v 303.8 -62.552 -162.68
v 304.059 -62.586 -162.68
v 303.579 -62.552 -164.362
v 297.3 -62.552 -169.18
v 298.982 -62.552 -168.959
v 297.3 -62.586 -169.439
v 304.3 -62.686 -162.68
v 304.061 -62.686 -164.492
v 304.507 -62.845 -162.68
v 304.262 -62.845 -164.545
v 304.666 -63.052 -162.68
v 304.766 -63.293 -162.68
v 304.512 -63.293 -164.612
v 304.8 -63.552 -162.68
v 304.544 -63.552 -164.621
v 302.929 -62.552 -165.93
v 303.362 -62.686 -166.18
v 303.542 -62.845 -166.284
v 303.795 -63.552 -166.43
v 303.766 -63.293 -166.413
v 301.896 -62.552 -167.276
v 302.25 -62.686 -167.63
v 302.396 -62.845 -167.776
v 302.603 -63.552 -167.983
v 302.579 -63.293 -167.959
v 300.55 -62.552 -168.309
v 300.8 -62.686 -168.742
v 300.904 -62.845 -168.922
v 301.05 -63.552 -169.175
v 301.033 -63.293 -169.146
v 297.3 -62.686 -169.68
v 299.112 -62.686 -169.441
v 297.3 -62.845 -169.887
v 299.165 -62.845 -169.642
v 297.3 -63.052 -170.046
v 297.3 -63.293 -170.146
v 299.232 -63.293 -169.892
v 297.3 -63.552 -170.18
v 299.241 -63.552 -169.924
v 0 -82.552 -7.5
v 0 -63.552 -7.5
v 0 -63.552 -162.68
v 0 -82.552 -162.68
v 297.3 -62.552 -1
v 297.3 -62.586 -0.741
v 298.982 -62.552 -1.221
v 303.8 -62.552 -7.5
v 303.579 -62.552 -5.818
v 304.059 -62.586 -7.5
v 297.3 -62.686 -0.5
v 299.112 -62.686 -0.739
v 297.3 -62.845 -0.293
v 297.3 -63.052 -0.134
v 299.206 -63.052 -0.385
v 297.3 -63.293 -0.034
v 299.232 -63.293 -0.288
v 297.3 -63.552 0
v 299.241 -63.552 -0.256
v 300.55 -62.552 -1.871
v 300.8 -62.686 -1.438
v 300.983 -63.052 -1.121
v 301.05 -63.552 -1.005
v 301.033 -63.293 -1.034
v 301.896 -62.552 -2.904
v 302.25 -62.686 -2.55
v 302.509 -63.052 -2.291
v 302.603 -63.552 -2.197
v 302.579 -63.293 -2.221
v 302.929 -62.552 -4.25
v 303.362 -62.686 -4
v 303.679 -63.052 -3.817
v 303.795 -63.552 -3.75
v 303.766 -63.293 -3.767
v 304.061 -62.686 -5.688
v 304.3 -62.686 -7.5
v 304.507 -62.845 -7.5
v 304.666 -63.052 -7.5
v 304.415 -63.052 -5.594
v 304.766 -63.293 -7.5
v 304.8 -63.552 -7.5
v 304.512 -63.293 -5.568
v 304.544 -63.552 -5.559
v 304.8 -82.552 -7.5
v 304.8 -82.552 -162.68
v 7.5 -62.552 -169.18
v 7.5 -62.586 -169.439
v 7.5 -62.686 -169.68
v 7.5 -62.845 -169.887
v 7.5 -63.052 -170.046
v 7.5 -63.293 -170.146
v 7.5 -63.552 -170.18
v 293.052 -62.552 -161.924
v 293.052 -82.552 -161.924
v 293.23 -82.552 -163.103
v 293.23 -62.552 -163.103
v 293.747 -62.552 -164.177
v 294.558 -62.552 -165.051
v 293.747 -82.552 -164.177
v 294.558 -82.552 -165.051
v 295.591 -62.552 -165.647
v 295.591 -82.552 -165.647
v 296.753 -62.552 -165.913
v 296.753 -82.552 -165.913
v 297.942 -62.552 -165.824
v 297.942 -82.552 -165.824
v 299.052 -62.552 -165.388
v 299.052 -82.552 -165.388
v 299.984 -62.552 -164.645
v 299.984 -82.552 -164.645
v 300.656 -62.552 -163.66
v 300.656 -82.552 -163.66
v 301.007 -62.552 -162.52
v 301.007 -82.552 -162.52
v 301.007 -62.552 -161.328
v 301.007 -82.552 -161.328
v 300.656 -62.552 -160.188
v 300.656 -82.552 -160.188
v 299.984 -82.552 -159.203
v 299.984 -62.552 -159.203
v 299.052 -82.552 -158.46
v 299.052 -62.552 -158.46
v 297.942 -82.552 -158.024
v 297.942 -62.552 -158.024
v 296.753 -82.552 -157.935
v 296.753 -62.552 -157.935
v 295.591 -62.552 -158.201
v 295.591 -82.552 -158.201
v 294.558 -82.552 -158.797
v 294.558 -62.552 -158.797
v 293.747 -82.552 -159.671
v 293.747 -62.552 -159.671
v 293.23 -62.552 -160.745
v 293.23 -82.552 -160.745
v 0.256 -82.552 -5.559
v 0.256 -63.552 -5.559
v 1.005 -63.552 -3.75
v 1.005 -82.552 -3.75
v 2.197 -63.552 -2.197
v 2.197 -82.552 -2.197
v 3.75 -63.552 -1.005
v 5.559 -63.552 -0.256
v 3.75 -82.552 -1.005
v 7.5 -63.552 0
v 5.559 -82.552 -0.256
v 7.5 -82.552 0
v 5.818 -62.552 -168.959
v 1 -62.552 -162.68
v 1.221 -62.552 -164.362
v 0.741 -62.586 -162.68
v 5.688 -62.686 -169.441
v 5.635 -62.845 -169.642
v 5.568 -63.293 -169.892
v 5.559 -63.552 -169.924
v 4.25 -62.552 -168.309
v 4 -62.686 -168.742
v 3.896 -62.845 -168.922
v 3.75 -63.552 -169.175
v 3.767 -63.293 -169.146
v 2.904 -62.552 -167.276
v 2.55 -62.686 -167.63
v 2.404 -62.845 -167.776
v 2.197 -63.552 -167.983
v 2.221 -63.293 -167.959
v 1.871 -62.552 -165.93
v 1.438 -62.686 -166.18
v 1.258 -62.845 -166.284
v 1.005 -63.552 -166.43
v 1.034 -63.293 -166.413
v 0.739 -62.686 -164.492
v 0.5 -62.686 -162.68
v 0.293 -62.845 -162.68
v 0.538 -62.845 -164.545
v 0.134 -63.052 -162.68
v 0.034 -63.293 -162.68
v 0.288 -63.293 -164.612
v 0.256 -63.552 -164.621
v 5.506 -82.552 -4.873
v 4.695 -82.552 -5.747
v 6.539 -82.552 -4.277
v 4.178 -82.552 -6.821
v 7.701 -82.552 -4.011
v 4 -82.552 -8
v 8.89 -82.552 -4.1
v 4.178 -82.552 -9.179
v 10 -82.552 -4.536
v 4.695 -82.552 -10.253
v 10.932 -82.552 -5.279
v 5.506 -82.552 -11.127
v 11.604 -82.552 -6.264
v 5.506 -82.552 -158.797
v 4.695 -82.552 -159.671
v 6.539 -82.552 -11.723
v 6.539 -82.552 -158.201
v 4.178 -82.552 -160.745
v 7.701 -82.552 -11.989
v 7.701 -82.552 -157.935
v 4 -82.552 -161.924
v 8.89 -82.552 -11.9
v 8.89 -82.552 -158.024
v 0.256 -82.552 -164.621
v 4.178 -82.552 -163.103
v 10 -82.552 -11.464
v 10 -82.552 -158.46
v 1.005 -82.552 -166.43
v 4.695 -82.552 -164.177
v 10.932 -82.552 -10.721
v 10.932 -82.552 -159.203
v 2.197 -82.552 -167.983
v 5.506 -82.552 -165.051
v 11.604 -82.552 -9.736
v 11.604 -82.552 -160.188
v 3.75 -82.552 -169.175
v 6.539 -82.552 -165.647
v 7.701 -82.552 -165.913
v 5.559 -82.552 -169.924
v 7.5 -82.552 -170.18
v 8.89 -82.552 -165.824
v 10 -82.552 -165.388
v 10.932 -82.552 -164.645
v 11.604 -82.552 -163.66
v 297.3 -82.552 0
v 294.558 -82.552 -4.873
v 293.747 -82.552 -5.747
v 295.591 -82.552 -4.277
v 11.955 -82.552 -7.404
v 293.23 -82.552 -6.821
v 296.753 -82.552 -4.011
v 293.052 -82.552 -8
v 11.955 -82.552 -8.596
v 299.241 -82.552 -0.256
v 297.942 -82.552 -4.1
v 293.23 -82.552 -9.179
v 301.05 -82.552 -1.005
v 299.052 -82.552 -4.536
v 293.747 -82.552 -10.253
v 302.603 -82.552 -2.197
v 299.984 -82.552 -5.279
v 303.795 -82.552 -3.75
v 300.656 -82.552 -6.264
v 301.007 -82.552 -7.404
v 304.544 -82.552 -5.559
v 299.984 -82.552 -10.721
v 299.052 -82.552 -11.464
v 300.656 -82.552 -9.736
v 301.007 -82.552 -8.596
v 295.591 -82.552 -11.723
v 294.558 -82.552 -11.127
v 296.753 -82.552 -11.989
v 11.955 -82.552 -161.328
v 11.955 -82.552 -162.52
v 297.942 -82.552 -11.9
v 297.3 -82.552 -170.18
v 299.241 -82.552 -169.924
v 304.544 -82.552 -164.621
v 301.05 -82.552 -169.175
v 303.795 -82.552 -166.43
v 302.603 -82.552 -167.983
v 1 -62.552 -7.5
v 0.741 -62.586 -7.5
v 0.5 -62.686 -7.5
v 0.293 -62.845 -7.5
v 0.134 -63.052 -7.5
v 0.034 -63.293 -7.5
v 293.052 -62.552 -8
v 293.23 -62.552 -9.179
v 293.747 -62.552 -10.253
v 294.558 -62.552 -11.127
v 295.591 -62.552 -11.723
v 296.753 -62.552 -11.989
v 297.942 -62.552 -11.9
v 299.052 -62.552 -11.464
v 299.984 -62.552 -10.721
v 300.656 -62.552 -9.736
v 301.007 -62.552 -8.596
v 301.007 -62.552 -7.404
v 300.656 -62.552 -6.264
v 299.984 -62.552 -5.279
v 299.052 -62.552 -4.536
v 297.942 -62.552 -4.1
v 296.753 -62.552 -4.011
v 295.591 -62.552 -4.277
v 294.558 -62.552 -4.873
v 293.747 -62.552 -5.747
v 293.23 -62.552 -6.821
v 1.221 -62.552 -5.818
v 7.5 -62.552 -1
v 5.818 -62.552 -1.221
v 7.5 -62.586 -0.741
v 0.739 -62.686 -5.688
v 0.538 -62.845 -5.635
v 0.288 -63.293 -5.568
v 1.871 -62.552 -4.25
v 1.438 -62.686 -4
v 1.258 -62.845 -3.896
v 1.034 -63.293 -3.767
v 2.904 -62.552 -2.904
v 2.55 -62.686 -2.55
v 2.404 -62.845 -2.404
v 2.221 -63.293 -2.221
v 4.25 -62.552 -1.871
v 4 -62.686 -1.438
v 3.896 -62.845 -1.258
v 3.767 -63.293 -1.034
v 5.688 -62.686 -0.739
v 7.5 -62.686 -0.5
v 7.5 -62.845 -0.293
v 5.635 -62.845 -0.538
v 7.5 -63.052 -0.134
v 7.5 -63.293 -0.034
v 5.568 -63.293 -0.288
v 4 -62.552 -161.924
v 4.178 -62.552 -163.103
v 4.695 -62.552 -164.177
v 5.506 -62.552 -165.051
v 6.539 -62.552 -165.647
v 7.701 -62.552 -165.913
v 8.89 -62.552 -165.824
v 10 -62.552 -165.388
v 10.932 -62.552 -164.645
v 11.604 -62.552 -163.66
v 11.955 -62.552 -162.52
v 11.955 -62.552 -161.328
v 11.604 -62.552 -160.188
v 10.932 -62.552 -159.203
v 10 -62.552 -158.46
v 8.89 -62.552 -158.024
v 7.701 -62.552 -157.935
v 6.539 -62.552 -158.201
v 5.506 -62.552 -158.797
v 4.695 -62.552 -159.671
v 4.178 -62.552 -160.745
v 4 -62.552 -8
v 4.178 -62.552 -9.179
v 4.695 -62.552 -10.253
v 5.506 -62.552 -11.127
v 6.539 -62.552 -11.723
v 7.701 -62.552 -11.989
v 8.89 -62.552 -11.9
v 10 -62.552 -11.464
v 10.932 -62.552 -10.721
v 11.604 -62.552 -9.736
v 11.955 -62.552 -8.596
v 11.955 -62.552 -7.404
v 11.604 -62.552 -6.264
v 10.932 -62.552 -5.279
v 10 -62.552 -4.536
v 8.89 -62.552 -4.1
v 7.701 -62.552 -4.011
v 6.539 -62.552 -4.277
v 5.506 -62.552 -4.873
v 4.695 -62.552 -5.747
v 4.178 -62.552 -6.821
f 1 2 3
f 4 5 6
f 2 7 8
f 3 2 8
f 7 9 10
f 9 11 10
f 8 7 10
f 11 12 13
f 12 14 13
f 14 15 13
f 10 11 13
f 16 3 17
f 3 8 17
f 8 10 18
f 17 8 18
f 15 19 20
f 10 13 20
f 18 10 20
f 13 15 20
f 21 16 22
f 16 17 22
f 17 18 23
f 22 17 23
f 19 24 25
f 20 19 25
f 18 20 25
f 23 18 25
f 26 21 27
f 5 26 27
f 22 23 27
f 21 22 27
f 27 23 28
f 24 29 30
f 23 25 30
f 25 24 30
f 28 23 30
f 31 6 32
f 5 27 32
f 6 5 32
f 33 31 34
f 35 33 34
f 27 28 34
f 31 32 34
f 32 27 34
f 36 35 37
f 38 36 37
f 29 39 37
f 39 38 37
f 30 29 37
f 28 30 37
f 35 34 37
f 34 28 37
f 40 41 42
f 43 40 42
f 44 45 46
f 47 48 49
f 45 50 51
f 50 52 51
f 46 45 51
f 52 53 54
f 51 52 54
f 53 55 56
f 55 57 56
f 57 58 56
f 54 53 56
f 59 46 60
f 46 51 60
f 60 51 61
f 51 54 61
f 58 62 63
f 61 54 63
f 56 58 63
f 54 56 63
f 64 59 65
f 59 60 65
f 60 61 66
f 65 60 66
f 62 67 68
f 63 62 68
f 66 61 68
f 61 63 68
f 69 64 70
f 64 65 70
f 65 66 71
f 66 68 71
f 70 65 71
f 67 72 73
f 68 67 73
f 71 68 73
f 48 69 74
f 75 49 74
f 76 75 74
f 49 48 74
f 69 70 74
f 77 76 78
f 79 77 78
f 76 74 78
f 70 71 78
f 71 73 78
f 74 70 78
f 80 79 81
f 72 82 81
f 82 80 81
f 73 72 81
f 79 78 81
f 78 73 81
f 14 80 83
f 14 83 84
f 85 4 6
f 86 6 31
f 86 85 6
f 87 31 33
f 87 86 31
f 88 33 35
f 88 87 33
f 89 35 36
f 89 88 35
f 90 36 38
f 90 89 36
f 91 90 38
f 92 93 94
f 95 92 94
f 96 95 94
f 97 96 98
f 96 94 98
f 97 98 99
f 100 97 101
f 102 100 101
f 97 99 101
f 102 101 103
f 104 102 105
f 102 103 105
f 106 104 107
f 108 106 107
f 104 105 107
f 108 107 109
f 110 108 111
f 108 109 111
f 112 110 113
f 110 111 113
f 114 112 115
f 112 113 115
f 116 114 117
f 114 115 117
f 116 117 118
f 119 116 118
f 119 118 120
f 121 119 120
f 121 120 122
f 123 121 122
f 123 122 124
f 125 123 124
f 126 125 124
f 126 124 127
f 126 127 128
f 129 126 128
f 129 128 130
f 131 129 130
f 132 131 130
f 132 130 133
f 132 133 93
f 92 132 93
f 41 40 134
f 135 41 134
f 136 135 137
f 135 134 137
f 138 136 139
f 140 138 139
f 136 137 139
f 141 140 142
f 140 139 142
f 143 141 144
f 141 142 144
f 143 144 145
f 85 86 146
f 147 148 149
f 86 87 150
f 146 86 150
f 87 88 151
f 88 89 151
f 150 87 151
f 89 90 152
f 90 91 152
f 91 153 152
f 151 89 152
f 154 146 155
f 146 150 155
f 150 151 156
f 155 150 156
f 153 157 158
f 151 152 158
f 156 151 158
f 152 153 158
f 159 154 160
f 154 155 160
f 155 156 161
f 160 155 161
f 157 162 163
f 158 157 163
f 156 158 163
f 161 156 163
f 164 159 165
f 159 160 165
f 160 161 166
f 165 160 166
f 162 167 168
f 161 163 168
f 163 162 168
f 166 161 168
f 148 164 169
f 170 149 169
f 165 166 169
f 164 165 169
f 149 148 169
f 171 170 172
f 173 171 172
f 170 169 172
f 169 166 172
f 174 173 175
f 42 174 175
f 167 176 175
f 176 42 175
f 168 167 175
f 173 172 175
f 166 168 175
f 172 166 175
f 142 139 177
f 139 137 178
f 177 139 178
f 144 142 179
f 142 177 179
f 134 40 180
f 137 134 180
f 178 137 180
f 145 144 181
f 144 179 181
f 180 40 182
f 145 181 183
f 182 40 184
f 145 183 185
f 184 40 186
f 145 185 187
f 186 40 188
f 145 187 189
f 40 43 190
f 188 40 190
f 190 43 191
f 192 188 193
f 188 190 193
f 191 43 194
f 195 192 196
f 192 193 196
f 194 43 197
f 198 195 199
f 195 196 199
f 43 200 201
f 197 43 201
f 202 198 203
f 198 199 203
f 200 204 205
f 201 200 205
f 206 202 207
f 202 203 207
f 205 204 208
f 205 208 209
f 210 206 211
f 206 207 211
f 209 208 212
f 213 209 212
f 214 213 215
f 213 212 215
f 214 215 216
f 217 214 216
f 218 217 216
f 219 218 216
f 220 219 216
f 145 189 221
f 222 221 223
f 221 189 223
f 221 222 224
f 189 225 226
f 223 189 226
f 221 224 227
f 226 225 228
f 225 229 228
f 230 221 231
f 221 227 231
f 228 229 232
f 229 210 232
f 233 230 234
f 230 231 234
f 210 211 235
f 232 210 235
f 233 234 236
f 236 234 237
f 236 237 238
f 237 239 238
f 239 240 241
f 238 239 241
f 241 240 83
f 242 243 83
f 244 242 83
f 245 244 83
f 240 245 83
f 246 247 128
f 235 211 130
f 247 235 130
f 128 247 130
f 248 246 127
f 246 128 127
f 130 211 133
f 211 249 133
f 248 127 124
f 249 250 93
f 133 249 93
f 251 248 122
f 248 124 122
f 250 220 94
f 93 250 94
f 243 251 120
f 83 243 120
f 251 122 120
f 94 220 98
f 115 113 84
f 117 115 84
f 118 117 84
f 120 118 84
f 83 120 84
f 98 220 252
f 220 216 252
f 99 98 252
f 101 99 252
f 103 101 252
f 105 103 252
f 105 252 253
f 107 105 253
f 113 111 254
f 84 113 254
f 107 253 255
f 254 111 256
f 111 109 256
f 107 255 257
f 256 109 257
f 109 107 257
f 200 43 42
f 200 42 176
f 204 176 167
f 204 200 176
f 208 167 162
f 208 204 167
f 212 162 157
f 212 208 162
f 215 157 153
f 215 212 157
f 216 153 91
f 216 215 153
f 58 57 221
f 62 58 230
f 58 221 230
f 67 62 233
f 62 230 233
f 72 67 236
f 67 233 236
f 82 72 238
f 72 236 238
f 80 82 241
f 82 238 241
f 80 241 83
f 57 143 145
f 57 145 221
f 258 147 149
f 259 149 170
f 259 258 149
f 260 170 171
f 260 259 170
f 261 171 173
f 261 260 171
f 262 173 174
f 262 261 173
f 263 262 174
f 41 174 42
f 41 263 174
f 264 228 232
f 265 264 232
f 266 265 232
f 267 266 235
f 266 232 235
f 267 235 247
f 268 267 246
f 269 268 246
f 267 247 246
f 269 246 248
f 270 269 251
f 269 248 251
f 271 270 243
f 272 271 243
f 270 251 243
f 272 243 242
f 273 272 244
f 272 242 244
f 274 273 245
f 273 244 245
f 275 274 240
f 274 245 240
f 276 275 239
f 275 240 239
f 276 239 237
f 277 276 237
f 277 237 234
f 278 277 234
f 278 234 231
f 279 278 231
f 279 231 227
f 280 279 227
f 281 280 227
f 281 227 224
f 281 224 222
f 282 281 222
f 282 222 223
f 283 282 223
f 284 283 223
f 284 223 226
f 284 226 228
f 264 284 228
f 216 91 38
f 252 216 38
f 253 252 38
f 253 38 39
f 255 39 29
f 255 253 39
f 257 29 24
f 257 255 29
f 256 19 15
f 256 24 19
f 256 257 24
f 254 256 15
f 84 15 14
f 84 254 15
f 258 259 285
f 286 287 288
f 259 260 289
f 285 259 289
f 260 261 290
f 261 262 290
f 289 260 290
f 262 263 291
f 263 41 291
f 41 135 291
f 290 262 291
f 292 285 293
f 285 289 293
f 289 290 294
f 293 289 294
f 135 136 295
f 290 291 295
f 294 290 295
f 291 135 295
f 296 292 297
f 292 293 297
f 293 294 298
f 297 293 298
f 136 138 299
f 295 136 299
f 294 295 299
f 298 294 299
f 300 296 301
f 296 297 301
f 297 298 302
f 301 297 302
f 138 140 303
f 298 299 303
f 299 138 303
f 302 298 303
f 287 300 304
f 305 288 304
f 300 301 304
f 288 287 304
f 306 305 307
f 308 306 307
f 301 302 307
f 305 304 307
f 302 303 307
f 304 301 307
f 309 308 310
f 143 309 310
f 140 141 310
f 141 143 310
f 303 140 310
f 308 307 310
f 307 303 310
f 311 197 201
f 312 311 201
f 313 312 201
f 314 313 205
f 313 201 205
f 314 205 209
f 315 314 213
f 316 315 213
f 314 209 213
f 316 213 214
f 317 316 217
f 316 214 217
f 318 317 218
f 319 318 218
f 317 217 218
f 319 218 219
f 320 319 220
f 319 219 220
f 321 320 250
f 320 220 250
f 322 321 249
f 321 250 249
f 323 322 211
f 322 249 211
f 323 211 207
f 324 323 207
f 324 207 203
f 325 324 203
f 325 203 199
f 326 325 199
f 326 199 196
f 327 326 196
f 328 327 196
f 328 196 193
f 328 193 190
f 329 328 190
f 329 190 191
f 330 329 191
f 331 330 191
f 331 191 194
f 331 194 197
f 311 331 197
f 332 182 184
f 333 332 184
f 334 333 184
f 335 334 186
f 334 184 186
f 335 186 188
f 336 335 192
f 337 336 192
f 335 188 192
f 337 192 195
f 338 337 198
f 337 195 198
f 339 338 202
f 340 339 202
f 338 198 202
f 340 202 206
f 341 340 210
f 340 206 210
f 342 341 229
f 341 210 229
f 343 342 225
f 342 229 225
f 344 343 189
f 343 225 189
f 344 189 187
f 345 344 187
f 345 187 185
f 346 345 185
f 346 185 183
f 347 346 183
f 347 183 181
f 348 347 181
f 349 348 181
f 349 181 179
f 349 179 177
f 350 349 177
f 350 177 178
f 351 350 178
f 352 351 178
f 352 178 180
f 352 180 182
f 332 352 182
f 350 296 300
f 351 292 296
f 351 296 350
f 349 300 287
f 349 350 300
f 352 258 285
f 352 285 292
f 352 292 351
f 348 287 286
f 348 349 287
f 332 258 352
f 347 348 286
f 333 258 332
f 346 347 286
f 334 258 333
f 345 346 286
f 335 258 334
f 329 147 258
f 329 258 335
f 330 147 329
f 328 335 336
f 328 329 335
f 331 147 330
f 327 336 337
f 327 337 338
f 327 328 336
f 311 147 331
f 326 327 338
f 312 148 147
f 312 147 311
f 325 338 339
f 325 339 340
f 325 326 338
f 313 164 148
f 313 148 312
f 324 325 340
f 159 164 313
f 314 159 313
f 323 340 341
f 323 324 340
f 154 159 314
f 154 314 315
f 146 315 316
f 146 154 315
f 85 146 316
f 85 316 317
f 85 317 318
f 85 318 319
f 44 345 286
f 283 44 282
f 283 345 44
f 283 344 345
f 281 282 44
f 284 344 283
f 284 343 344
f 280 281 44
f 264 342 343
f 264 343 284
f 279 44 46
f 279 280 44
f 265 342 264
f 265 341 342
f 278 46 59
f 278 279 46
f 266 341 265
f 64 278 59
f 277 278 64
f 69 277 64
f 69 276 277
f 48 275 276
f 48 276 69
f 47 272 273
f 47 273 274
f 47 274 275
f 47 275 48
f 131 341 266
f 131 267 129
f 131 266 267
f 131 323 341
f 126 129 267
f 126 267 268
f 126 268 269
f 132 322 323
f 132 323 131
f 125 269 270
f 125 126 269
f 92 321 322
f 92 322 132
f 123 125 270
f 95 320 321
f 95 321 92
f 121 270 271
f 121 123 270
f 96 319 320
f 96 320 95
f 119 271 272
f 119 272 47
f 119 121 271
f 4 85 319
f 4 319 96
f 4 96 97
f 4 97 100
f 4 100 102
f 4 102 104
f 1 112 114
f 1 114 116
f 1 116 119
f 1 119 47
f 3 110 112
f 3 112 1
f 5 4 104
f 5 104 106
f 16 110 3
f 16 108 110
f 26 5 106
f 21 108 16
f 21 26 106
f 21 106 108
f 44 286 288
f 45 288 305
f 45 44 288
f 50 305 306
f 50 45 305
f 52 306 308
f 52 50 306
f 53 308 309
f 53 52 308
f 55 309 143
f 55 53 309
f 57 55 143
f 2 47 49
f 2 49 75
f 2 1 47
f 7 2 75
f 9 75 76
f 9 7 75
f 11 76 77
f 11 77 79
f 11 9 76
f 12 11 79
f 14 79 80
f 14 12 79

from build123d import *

# Parameters (mm, degrees)
SKETCH1_W           = 304.8
SKETCH1_H           = 170.18
BOSS_EXTRUDE1_DEPTH = 20
HOLE1_D             = 8
FILLET1_R           = 7.5
FILLET2_R           = 1


with BuildPart() as part:
    # Sketch1 → Boss-Extrude1 (new body)
    with BuildSketch(Plane(origin=(0, -62.552068535, 0), x_dir=(1, 0, 0), z_dir=(0, 1, 0))):
        with Locations((152.4, 85.09)):
            Rectangle(SKETCH1_W, SKETCH1_H)
    extrude(amount=-BOSS_EXTRUDE1_DEPTH)

    # Hole1 (through all)
    with Locations(Plane(origin=(0, -62.552068535, 0), x_dir=(1, 0, 0), z_dir=(0, 1, 0))):
        with Locations((8, 8), (297.052, 8), (8, 161.924), (297.052, 161.924)):
            Hole(HOLE1_D / 2)

    # Fillet1
    fillet1_edges = [part.edges().sort_by_distance(p)[0] for p in [
        (0, -72.552068535, -170.18),
        (304.8, -72.552068535, -170.18),
        (304.8, -72.552068535, 0),
        (0, -72.552068535, 0),
    ]]
    fillet(fillet1_edges, radius=FILLET1_R)

    # Fillet2
    fillet2_edges = [part.edges().sort_by_distance(p)[0] for p in [
        (304.8, -62.552068535, -85.09),
        (0, -62.552068535, -85.09),
        (152.4, -62.552068535, 0),
        (152.4, -62.552068535, -170.18),
        (2.196699141, -62.552068535, -2.196699141),
        (2.196699141, -62.552068535, -167.983300859),
        (302.603300859, -62.552068535, -2.196699141),
        (302.603300859, -62.552068535, -167.983300859),
    ]]
    fillet(fillet2_edges, radius=FILLET2_R)


solid = part.part
